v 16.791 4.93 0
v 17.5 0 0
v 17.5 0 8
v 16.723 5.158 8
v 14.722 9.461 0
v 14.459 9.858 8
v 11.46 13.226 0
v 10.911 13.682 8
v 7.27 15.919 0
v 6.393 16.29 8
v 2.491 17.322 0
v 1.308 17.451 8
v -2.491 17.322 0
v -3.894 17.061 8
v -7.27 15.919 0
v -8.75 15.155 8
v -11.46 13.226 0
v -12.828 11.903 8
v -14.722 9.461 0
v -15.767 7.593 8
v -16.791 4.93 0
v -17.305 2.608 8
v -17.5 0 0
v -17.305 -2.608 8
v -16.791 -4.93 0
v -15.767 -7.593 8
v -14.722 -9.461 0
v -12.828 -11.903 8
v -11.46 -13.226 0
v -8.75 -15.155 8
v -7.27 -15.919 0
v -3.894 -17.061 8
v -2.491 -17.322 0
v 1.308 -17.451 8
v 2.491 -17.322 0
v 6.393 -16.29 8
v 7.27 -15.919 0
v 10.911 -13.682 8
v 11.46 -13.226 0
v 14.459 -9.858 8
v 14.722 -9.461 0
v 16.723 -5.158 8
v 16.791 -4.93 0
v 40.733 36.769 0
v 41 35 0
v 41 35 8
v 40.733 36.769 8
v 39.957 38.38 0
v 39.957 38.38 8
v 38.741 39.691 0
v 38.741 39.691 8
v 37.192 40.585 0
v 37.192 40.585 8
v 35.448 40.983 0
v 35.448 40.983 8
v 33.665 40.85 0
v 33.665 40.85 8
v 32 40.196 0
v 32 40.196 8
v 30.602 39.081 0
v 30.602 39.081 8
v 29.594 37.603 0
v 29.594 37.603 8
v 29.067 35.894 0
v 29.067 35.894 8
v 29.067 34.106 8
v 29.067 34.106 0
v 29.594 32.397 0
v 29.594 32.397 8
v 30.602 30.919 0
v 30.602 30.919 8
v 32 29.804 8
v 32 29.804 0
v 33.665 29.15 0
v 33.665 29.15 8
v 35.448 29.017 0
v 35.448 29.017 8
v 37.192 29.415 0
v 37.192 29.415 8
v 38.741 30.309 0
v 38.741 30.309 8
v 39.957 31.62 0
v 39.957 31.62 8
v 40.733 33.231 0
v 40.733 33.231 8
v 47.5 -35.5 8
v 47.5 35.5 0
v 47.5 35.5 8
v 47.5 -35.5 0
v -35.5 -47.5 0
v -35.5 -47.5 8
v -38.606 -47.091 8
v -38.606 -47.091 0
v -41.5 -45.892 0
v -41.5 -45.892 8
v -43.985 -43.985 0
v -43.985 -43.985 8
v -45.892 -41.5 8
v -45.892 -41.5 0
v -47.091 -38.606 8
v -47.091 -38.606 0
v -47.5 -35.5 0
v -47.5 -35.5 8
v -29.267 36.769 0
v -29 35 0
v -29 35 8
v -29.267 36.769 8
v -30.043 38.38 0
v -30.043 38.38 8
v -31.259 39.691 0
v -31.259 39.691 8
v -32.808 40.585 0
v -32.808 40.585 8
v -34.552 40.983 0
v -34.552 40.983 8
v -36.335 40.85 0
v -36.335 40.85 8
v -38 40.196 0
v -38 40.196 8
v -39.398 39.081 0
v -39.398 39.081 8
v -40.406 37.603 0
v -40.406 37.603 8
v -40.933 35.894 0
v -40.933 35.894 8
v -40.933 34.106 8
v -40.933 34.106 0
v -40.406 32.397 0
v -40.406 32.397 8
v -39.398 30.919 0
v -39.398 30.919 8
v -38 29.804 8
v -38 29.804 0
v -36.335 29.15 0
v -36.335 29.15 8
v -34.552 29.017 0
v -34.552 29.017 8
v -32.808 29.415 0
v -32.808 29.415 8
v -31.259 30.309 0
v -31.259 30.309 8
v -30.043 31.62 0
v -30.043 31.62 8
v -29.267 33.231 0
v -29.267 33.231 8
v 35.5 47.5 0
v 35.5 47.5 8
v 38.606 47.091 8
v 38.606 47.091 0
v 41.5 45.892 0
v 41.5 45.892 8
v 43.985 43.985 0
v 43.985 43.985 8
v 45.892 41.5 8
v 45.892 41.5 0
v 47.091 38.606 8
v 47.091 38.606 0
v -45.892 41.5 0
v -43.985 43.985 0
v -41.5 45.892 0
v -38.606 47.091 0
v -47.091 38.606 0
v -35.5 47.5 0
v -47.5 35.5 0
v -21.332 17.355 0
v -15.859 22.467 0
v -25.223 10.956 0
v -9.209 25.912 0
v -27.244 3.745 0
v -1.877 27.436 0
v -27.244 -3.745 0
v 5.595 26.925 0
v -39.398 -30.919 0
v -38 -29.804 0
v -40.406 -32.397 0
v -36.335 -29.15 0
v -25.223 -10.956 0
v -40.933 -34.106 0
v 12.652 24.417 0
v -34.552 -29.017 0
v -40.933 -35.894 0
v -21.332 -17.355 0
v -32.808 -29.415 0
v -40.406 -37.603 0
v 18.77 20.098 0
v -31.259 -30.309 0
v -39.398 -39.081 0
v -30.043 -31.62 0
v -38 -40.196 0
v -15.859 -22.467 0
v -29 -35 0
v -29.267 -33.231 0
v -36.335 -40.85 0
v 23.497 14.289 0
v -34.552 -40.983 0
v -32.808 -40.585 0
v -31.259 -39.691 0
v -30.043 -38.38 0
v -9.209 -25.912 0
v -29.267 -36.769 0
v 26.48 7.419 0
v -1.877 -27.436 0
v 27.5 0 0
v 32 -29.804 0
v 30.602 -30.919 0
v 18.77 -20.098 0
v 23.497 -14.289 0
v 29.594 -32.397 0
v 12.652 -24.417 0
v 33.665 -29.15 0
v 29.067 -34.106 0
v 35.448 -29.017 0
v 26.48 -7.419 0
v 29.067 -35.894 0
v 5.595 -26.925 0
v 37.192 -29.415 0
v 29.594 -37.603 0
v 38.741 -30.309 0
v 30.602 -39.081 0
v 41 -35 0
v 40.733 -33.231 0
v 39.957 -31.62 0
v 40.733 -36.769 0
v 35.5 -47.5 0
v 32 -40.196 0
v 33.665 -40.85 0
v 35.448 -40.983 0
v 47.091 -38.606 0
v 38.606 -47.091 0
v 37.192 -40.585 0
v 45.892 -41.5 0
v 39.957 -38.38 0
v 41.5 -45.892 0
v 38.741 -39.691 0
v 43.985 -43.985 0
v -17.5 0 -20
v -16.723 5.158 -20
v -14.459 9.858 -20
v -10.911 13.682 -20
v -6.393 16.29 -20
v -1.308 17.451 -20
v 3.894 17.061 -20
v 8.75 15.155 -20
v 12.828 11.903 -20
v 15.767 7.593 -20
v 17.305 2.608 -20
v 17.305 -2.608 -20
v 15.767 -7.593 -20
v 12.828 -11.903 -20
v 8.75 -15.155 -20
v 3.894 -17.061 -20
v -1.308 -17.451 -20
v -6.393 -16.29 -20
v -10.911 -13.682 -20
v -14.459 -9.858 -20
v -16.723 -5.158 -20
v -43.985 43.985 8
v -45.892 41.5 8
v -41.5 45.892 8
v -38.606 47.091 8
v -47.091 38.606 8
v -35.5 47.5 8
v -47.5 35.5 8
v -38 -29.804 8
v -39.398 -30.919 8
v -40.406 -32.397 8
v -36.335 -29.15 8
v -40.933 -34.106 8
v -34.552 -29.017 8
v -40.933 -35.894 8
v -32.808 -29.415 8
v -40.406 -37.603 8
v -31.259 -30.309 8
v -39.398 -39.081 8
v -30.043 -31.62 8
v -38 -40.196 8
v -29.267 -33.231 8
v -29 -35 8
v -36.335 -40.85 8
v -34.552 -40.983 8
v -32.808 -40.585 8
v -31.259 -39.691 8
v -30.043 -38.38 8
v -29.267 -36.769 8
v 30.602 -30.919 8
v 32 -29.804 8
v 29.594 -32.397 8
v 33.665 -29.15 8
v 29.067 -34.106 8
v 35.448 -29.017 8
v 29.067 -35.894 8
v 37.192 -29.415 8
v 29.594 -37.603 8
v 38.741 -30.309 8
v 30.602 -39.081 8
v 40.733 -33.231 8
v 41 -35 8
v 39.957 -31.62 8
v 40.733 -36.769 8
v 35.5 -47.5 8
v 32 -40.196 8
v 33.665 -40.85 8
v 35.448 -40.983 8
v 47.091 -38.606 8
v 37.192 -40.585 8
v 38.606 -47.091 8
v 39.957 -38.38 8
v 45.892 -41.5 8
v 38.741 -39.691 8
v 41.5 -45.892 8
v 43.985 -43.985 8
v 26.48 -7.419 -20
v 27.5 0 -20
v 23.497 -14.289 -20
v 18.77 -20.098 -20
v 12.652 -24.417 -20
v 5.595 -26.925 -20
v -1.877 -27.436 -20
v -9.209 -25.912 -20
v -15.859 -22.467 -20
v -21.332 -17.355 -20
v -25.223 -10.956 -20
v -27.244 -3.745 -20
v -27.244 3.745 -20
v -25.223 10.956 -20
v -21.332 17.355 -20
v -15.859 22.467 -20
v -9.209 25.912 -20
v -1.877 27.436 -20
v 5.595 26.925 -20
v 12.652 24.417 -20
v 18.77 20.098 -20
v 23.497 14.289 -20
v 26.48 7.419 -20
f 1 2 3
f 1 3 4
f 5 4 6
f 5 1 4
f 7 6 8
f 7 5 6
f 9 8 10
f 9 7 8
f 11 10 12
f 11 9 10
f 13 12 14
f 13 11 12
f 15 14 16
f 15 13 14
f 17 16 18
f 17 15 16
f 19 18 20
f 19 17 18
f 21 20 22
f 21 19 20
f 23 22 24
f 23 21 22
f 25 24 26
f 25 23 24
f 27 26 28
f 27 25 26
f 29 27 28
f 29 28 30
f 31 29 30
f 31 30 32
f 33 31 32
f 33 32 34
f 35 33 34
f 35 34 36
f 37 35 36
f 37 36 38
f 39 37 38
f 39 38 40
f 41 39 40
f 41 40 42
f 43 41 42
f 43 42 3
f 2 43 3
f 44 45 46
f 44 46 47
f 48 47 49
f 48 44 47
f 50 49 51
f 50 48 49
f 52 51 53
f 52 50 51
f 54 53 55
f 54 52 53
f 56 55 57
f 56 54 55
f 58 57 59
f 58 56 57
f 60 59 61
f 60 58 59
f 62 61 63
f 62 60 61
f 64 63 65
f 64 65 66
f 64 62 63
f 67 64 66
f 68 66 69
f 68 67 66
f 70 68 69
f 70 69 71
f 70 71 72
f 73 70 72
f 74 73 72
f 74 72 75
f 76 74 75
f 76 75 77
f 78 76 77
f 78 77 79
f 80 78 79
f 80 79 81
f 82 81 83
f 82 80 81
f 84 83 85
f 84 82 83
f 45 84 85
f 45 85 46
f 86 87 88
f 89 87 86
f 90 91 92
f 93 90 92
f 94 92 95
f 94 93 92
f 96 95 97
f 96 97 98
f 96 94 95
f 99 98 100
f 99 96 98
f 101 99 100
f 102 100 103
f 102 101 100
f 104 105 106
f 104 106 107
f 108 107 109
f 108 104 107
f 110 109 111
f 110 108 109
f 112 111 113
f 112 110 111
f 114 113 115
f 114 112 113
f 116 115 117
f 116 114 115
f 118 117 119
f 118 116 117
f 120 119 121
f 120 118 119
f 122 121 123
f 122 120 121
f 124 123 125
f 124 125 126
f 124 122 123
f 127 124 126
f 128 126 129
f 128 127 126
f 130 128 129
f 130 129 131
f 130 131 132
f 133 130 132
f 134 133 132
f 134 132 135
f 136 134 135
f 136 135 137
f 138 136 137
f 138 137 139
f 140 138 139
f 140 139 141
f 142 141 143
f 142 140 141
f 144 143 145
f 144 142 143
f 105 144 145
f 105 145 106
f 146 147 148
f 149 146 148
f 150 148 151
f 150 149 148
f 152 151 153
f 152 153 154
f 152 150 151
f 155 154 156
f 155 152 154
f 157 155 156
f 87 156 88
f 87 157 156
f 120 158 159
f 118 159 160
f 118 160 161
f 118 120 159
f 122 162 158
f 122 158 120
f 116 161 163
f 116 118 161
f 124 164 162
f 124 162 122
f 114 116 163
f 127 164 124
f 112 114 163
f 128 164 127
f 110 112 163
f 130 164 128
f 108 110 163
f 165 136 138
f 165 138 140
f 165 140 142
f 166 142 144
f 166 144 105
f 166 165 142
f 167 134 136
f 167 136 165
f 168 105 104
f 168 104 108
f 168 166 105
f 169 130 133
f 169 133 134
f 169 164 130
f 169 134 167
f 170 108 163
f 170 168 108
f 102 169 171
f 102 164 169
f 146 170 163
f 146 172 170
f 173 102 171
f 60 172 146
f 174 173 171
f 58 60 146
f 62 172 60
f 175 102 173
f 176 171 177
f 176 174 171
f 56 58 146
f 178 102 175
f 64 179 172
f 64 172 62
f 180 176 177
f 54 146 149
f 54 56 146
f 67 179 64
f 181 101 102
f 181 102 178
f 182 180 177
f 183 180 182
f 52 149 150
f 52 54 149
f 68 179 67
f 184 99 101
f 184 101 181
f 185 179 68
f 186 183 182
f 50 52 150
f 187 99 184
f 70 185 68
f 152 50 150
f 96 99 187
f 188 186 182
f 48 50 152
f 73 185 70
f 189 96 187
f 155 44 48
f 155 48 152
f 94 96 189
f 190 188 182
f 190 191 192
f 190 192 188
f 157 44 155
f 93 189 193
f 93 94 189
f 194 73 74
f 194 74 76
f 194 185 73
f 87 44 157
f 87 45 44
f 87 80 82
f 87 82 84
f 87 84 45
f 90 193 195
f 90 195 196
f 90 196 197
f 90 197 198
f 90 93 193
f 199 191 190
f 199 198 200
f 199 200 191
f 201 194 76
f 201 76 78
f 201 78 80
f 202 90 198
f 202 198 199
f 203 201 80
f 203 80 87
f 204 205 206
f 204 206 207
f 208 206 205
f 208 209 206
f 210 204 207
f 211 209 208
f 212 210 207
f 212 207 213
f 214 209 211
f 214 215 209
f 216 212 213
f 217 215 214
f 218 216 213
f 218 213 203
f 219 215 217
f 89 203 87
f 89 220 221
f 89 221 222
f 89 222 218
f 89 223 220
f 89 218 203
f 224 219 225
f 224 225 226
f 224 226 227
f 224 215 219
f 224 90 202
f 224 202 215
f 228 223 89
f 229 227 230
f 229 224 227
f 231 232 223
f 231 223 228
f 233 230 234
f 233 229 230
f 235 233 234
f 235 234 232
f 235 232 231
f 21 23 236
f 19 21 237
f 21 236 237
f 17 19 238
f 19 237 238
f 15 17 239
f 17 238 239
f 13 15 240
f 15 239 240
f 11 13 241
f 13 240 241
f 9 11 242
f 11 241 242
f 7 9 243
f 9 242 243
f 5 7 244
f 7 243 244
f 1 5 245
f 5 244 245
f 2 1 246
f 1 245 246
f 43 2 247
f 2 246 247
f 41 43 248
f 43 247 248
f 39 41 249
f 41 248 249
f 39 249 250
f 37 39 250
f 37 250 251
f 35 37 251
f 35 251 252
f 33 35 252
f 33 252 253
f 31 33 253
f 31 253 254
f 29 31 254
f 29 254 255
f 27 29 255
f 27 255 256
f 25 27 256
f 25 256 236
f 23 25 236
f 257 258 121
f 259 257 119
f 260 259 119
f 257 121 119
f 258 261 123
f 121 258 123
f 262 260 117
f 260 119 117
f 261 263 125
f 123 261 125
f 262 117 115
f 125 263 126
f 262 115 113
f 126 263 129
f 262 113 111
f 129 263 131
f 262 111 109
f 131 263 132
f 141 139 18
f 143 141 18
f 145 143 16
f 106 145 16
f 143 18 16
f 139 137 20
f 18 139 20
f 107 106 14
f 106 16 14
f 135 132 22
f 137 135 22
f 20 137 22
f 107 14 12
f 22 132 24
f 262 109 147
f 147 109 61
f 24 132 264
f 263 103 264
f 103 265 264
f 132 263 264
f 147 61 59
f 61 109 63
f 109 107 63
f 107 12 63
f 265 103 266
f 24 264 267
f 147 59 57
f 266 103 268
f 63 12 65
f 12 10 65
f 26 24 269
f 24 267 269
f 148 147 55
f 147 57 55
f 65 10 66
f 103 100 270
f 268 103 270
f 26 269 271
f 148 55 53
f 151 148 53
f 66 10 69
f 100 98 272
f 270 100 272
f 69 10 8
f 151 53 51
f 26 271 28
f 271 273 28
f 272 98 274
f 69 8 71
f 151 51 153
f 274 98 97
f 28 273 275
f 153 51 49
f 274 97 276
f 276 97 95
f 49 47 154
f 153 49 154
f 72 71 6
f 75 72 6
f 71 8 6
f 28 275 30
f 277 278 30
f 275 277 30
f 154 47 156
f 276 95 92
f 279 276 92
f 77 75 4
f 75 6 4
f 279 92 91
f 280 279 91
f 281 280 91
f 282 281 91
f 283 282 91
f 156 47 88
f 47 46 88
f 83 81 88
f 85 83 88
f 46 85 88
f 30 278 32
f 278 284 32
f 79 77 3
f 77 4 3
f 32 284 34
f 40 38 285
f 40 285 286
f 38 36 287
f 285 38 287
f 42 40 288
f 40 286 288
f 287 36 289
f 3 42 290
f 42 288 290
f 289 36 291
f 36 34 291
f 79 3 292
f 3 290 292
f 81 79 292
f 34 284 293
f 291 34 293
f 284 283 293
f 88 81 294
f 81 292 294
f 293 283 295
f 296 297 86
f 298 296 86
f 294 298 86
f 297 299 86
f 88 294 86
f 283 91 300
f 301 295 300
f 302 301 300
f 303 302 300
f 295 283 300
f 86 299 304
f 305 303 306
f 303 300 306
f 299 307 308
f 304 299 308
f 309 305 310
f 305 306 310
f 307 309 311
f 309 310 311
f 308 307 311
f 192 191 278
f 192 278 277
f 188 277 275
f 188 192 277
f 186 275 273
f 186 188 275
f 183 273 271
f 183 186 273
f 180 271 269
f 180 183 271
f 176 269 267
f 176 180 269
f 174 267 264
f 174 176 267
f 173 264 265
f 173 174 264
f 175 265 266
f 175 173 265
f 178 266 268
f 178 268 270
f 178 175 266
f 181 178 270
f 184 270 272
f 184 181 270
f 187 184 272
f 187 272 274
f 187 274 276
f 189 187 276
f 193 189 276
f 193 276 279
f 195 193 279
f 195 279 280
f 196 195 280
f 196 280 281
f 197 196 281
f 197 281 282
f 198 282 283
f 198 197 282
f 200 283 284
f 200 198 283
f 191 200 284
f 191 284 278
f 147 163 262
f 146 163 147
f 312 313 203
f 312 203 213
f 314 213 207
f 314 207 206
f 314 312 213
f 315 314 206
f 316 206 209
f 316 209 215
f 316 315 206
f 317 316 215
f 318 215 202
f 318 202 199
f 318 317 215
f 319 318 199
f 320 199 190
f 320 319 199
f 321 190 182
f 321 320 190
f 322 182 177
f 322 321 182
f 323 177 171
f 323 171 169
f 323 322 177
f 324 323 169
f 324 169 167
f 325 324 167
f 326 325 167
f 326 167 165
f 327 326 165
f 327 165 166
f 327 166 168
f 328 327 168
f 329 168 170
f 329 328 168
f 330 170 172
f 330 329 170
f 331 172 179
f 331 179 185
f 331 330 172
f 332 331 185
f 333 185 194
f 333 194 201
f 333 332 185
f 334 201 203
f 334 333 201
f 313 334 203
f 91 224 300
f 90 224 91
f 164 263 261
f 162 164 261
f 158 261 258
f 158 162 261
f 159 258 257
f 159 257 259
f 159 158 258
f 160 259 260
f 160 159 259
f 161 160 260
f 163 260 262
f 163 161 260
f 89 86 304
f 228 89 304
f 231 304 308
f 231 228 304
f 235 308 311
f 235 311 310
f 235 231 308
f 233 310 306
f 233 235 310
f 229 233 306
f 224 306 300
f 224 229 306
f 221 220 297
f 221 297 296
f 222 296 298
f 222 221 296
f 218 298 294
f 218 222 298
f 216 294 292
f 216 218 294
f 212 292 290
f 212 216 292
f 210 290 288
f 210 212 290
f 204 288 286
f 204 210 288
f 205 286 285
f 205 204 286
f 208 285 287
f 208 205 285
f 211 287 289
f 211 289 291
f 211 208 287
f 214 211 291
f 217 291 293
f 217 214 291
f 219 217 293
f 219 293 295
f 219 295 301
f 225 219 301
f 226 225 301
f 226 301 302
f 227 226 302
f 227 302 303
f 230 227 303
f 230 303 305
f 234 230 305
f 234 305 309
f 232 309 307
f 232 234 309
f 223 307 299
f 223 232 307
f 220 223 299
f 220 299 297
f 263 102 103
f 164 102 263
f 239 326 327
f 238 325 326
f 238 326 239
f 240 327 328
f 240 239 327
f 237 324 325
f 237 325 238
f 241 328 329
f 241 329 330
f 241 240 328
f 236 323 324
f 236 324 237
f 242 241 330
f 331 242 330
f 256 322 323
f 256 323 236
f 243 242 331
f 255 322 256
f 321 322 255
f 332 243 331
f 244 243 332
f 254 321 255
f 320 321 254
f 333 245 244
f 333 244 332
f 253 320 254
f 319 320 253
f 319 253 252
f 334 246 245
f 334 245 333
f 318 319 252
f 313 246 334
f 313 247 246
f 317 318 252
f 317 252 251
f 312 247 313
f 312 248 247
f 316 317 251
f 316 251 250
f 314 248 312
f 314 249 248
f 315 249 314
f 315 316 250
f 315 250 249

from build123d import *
from build123d.topology import SkipClean

# Parameters (mm, degrees)
SKETCH1_R           = 6
SKETCH1_R_2         = 17.5
BOSS_EXTRUDE1_DEPTH = 8
BOSS_EXTRUDE2_START = 20
SKETCH2_R           = 27.5
SKETCH2_R_2         = 17.5
BOSS_EXTRUDE2_DEPTH = 20


with BuildPart() as part:
    # Sketch1 → Boss-Extrude1 (new body)
    with BuildSketch(Plane(origin=(0, 0, 0), x_dir=(-1, 0, 0), z_dir=(0, 0, 1))):
        with BuildLine():
            Line((-35.5, 47.5), (35.5, 47.5))
            ThreePointArc((35.5, 47.5), (43.985281374, 43.985281374), (47.5, 35.5))
            Line((47.5, 35.5), (47.5, -35.5))
            ThreePointArc((47.5, -35.5), (43.985281374, -43.985281374), (35.5, -47.5))
            Line((35.5, -47.5), (-35.5, -47.5))
            ThreePointArc((-35.5, -47.5), (-43.985281374, -43.985281374), (-47.5, -35.5))
            Line((-47.5, -35.5), (-47.5, 35.5))
            ThreePointArc((-47.5, 35.5), (-43.985281374, 43.985281374), (-35.5, 47.5))
        make_face()
        with Locations(Location((35, 35, 0), (0, 0, 180))):
            Circle(SKETCH1_R, mode=Mode.SUBTRACT)
        with Locations(Location((-35, 35, 0), (0, 0, 180))):
            Circle(SKETCH1_R, mode=Mode.SUBTRACT)
        with Locations(Location((35, -35, 0), (0, 0, 180))):
            Circle(SKETCH1_R, mode=Mode.SUBTRACT)
        with Locations(Location((-35, -35, 0), (0, 0, 180))):
            Circle(SKETCH1_R, mode=Mode.SUBTRACT)
        with Locations(Location((0, 0, 0), (0, 0, 180))):
            Circle(SKETCH1_R_2, mode=Mode.SUBTRACT)
    extrude(amount=BOSS_EXTRUDE1_DEPTH)

    # Sketch2 → Boss-Extrude2 (add)
    with SkipClean():  # the faces are left unmerged after this step: merging them gives an invalid solid
        with BuildSketch(Plane(origin=(0, 0, 0), x_dir=(-1, 0, 0), z_dir=(0, 0, -1)).offset(BOSS_EXTRUDE2_START)):
            with Locations(Location((0, 0, 0), (0, 0, 180))):
                Circle(SKETCH2_R)
            Circle(SKETCH2_R_2, mode=Mode.SUBTRACT)
        extrude(amount=-BOSS_EXTRUDE2_DEPTH)


solid = part.part
